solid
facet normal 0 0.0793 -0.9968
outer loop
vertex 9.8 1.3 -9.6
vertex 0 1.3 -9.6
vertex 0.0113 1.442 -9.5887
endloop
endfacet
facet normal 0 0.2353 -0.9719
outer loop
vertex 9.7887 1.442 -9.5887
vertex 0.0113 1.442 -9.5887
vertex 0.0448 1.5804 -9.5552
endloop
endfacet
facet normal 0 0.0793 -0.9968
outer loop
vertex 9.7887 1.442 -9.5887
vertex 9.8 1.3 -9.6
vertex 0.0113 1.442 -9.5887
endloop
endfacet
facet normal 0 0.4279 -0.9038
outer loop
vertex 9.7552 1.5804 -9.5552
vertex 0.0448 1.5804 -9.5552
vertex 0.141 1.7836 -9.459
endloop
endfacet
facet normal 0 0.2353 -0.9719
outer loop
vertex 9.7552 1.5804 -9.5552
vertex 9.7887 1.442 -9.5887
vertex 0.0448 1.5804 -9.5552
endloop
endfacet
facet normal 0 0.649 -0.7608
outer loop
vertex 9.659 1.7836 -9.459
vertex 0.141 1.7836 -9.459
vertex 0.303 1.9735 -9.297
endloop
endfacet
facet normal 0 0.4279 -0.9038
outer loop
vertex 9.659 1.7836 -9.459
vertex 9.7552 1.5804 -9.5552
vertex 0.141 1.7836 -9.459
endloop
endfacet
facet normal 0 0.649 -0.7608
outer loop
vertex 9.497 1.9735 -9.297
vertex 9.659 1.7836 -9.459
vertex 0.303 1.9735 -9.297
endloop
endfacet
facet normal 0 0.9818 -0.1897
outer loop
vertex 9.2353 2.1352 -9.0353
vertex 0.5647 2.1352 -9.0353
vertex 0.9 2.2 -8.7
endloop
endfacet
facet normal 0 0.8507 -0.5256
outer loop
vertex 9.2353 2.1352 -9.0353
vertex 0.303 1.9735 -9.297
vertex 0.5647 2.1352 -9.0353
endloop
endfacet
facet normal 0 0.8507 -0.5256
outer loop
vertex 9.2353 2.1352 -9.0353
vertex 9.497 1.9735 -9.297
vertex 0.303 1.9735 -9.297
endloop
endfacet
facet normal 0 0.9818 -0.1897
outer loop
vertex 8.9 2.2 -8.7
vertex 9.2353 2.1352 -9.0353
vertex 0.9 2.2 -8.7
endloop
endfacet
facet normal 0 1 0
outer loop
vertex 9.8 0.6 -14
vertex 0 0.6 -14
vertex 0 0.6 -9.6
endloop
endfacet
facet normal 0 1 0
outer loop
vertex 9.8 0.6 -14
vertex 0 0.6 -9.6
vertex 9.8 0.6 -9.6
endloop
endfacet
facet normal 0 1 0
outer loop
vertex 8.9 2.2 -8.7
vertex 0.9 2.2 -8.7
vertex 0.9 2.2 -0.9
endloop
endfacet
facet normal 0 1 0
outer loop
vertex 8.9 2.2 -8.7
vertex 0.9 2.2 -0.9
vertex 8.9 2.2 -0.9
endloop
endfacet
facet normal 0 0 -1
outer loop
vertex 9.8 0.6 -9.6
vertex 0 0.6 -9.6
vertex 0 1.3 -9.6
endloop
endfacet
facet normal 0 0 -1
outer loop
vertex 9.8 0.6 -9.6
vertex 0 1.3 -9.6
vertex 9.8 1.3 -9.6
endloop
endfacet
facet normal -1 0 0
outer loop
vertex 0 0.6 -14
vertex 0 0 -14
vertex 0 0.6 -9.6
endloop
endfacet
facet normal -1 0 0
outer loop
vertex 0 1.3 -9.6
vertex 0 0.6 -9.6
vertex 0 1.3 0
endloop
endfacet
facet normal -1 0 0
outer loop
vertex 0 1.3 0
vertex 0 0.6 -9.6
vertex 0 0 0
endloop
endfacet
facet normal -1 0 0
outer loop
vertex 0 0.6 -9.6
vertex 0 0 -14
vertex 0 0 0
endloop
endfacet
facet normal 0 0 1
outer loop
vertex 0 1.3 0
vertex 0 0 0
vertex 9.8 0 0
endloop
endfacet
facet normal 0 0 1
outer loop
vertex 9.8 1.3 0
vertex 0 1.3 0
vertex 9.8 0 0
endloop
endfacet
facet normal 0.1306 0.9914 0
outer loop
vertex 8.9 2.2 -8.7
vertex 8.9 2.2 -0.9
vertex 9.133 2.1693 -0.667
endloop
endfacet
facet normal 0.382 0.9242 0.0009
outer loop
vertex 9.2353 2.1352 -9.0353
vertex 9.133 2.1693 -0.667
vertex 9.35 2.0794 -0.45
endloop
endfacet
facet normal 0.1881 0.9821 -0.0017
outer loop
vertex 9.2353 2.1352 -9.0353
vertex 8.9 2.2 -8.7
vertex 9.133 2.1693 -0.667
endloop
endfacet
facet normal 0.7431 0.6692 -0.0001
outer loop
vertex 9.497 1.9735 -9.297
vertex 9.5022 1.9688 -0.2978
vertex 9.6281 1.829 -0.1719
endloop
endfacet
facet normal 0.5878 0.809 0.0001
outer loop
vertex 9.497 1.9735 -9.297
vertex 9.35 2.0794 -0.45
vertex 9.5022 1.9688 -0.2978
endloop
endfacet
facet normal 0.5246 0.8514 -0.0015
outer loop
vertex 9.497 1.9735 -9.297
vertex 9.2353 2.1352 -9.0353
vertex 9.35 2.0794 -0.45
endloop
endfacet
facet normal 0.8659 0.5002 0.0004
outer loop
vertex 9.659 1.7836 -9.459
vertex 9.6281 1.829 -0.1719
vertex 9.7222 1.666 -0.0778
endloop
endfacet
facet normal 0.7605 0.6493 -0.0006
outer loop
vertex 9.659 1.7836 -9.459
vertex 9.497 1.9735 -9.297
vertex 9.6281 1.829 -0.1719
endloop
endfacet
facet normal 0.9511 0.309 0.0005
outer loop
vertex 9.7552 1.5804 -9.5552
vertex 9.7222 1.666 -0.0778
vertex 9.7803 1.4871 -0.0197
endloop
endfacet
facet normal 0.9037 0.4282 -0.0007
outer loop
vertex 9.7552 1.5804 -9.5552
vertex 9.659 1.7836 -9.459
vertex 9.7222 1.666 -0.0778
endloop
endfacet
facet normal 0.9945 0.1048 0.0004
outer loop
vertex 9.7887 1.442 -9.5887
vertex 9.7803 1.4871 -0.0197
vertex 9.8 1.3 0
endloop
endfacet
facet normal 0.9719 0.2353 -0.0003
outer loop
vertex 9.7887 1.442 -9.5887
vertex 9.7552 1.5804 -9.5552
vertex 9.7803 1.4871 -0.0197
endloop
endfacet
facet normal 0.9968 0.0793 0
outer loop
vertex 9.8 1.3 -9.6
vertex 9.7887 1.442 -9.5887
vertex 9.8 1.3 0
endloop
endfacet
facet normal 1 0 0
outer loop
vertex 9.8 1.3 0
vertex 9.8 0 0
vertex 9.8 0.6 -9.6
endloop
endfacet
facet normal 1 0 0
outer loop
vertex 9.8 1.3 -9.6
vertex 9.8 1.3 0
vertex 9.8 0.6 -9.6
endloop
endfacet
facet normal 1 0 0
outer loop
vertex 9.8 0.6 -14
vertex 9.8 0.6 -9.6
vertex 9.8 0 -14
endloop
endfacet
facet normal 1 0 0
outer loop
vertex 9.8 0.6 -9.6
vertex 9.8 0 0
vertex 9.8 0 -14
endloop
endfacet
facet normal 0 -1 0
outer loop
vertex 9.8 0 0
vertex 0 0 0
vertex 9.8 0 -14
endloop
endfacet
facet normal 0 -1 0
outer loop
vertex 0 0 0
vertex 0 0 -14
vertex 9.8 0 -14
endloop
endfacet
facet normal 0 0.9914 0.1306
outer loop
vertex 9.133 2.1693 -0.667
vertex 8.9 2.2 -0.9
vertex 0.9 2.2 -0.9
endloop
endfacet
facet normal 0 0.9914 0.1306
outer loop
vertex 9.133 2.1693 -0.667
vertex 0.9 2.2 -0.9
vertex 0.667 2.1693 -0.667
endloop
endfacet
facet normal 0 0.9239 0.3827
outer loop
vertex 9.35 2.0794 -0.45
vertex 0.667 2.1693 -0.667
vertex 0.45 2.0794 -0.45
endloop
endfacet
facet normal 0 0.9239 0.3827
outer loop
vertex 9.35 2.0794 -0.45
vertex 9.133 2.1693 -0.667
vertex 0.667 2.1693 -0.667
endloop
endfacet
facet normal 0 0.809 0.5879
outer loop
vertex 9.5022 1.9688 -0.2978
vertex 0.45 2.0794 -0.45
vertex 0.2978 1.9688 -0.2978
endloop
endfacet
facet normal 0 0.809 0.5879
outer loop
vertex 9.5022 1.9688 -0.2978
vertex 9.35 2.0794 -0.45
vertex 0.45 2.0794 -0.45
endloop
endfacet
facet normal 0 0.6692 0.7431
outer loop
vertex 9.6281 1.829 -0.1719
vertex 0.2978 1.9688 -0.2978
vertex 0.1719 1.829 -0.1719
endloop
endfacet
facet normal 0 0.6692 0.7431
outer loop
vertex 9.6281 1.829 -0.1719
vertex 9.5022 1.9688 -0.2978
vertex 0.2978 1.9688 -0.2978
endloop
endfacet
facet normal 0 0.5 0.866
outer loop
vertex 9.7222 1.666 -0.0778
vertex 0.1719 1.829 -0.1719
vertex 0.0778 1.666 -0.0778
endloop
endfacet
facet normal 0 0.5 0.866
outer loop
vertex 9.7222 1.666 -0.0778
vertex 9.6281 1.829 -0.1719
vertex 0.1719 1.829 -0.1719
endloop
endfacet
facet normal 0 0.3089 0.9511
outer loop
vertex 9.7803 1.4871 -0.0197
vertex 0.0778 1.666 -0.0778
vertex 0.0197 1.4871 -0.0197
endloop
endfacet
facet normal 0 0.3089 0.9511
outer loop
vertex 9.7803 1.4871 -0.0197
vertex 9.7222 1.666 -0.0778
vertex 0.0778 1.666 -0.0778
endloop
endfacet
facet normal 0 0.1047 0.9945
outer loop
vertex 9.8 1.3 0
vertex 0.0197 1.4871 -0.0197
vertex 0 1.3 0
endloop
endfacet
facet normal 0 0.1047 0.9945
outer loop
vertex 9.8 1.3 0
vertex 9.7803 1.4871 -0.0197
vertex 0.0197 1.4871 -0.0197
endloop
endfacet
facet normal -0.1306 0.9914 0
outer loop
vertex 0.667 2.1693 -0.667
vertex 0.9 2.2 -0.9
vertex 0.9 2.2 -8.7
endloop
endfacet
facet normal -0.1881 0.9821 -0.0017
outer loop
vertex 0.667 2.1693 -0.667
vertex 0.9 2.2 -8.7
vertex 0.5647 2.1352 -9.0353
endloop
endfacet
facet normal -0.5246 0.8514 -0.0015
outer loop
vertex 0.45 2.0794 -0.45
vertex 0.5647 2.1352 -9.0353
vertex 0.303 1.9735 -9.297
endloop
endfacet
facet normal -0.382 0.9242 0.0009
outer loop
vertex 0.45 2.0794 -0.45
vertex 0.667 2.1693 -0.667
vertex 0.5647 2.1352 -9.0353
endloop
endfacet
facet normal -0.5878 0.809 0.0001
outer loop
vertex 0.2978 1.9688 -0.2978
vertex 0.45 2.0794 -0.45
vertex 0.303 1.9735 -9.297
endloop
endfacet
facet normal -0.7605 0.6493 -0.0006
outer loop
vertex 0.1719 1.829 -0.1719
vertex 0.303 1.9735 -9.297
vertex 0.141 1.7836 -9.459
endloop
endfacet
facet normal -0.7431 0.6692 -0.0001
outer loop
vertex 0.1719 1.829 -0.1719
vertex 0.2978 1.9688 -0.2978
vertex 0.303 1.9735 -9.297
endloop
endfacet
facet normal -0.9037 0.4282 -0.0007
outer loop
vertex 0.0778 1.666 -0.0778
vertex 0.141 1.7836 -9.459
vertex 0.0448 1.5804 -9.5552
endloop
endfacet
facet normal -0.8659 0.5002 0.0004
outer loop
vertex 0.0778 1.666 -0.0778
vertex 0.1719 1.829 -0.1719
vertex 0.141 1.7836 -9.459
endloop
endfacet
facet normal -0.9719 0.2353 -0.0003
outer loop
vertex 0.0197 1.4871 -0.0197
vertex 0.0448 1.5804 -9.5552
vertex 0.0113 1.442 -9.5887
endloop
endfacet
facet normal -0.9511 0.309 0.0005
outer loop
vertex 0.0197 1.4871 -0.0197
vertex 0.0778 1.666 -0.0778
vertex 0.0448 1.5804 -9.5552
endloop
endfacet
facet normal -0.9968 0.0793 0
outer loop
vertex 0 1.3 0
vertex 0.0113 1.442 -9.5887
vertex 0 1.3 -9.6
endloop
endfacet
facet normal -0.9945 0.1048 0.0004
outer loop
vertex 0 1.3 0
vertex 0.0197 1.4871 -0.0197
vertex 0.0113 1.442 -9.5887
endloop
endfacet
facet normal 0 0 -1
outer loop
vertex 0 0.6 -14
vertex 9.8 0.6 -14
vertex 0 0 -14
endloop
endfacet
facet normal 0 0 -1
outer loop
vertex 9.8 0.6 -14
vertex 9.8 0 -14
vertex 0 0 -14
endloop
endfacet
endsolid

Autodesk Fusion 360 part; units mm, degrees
sketch "Sketch1" plane through (0, 0, 0) normal (0, 1, 0) x (1, 0, 0)
  line L0 (0, 0) -> (9.8, 0)
  line L1 (9.8, 0) -> (9.8, 14)
  line L2 (9.8, 14) -> (0, 14)
  line L3 (0, 14) -> (0, 0)
  line L4 (0, 9.6) -> (9.8, 9.6)
  dimension "d1" = 9.8
  dimension "d2" = 14
  dimension "d3" = 9.6
extrude "Extrude1" add sketch "Sketch1" along normal blind 0.6
extrude "Extrude2" add sketch "Sketch1" along normal blind 2.2 contours L0 L1 L3 L4
fillet "Fillet1" radius 0.9 4 edges at (4.9, 2.2, -9.6) (0, 2.2, -4.8) (4.9, 2.2, 0) (9.8, 2.2, -4.8)
